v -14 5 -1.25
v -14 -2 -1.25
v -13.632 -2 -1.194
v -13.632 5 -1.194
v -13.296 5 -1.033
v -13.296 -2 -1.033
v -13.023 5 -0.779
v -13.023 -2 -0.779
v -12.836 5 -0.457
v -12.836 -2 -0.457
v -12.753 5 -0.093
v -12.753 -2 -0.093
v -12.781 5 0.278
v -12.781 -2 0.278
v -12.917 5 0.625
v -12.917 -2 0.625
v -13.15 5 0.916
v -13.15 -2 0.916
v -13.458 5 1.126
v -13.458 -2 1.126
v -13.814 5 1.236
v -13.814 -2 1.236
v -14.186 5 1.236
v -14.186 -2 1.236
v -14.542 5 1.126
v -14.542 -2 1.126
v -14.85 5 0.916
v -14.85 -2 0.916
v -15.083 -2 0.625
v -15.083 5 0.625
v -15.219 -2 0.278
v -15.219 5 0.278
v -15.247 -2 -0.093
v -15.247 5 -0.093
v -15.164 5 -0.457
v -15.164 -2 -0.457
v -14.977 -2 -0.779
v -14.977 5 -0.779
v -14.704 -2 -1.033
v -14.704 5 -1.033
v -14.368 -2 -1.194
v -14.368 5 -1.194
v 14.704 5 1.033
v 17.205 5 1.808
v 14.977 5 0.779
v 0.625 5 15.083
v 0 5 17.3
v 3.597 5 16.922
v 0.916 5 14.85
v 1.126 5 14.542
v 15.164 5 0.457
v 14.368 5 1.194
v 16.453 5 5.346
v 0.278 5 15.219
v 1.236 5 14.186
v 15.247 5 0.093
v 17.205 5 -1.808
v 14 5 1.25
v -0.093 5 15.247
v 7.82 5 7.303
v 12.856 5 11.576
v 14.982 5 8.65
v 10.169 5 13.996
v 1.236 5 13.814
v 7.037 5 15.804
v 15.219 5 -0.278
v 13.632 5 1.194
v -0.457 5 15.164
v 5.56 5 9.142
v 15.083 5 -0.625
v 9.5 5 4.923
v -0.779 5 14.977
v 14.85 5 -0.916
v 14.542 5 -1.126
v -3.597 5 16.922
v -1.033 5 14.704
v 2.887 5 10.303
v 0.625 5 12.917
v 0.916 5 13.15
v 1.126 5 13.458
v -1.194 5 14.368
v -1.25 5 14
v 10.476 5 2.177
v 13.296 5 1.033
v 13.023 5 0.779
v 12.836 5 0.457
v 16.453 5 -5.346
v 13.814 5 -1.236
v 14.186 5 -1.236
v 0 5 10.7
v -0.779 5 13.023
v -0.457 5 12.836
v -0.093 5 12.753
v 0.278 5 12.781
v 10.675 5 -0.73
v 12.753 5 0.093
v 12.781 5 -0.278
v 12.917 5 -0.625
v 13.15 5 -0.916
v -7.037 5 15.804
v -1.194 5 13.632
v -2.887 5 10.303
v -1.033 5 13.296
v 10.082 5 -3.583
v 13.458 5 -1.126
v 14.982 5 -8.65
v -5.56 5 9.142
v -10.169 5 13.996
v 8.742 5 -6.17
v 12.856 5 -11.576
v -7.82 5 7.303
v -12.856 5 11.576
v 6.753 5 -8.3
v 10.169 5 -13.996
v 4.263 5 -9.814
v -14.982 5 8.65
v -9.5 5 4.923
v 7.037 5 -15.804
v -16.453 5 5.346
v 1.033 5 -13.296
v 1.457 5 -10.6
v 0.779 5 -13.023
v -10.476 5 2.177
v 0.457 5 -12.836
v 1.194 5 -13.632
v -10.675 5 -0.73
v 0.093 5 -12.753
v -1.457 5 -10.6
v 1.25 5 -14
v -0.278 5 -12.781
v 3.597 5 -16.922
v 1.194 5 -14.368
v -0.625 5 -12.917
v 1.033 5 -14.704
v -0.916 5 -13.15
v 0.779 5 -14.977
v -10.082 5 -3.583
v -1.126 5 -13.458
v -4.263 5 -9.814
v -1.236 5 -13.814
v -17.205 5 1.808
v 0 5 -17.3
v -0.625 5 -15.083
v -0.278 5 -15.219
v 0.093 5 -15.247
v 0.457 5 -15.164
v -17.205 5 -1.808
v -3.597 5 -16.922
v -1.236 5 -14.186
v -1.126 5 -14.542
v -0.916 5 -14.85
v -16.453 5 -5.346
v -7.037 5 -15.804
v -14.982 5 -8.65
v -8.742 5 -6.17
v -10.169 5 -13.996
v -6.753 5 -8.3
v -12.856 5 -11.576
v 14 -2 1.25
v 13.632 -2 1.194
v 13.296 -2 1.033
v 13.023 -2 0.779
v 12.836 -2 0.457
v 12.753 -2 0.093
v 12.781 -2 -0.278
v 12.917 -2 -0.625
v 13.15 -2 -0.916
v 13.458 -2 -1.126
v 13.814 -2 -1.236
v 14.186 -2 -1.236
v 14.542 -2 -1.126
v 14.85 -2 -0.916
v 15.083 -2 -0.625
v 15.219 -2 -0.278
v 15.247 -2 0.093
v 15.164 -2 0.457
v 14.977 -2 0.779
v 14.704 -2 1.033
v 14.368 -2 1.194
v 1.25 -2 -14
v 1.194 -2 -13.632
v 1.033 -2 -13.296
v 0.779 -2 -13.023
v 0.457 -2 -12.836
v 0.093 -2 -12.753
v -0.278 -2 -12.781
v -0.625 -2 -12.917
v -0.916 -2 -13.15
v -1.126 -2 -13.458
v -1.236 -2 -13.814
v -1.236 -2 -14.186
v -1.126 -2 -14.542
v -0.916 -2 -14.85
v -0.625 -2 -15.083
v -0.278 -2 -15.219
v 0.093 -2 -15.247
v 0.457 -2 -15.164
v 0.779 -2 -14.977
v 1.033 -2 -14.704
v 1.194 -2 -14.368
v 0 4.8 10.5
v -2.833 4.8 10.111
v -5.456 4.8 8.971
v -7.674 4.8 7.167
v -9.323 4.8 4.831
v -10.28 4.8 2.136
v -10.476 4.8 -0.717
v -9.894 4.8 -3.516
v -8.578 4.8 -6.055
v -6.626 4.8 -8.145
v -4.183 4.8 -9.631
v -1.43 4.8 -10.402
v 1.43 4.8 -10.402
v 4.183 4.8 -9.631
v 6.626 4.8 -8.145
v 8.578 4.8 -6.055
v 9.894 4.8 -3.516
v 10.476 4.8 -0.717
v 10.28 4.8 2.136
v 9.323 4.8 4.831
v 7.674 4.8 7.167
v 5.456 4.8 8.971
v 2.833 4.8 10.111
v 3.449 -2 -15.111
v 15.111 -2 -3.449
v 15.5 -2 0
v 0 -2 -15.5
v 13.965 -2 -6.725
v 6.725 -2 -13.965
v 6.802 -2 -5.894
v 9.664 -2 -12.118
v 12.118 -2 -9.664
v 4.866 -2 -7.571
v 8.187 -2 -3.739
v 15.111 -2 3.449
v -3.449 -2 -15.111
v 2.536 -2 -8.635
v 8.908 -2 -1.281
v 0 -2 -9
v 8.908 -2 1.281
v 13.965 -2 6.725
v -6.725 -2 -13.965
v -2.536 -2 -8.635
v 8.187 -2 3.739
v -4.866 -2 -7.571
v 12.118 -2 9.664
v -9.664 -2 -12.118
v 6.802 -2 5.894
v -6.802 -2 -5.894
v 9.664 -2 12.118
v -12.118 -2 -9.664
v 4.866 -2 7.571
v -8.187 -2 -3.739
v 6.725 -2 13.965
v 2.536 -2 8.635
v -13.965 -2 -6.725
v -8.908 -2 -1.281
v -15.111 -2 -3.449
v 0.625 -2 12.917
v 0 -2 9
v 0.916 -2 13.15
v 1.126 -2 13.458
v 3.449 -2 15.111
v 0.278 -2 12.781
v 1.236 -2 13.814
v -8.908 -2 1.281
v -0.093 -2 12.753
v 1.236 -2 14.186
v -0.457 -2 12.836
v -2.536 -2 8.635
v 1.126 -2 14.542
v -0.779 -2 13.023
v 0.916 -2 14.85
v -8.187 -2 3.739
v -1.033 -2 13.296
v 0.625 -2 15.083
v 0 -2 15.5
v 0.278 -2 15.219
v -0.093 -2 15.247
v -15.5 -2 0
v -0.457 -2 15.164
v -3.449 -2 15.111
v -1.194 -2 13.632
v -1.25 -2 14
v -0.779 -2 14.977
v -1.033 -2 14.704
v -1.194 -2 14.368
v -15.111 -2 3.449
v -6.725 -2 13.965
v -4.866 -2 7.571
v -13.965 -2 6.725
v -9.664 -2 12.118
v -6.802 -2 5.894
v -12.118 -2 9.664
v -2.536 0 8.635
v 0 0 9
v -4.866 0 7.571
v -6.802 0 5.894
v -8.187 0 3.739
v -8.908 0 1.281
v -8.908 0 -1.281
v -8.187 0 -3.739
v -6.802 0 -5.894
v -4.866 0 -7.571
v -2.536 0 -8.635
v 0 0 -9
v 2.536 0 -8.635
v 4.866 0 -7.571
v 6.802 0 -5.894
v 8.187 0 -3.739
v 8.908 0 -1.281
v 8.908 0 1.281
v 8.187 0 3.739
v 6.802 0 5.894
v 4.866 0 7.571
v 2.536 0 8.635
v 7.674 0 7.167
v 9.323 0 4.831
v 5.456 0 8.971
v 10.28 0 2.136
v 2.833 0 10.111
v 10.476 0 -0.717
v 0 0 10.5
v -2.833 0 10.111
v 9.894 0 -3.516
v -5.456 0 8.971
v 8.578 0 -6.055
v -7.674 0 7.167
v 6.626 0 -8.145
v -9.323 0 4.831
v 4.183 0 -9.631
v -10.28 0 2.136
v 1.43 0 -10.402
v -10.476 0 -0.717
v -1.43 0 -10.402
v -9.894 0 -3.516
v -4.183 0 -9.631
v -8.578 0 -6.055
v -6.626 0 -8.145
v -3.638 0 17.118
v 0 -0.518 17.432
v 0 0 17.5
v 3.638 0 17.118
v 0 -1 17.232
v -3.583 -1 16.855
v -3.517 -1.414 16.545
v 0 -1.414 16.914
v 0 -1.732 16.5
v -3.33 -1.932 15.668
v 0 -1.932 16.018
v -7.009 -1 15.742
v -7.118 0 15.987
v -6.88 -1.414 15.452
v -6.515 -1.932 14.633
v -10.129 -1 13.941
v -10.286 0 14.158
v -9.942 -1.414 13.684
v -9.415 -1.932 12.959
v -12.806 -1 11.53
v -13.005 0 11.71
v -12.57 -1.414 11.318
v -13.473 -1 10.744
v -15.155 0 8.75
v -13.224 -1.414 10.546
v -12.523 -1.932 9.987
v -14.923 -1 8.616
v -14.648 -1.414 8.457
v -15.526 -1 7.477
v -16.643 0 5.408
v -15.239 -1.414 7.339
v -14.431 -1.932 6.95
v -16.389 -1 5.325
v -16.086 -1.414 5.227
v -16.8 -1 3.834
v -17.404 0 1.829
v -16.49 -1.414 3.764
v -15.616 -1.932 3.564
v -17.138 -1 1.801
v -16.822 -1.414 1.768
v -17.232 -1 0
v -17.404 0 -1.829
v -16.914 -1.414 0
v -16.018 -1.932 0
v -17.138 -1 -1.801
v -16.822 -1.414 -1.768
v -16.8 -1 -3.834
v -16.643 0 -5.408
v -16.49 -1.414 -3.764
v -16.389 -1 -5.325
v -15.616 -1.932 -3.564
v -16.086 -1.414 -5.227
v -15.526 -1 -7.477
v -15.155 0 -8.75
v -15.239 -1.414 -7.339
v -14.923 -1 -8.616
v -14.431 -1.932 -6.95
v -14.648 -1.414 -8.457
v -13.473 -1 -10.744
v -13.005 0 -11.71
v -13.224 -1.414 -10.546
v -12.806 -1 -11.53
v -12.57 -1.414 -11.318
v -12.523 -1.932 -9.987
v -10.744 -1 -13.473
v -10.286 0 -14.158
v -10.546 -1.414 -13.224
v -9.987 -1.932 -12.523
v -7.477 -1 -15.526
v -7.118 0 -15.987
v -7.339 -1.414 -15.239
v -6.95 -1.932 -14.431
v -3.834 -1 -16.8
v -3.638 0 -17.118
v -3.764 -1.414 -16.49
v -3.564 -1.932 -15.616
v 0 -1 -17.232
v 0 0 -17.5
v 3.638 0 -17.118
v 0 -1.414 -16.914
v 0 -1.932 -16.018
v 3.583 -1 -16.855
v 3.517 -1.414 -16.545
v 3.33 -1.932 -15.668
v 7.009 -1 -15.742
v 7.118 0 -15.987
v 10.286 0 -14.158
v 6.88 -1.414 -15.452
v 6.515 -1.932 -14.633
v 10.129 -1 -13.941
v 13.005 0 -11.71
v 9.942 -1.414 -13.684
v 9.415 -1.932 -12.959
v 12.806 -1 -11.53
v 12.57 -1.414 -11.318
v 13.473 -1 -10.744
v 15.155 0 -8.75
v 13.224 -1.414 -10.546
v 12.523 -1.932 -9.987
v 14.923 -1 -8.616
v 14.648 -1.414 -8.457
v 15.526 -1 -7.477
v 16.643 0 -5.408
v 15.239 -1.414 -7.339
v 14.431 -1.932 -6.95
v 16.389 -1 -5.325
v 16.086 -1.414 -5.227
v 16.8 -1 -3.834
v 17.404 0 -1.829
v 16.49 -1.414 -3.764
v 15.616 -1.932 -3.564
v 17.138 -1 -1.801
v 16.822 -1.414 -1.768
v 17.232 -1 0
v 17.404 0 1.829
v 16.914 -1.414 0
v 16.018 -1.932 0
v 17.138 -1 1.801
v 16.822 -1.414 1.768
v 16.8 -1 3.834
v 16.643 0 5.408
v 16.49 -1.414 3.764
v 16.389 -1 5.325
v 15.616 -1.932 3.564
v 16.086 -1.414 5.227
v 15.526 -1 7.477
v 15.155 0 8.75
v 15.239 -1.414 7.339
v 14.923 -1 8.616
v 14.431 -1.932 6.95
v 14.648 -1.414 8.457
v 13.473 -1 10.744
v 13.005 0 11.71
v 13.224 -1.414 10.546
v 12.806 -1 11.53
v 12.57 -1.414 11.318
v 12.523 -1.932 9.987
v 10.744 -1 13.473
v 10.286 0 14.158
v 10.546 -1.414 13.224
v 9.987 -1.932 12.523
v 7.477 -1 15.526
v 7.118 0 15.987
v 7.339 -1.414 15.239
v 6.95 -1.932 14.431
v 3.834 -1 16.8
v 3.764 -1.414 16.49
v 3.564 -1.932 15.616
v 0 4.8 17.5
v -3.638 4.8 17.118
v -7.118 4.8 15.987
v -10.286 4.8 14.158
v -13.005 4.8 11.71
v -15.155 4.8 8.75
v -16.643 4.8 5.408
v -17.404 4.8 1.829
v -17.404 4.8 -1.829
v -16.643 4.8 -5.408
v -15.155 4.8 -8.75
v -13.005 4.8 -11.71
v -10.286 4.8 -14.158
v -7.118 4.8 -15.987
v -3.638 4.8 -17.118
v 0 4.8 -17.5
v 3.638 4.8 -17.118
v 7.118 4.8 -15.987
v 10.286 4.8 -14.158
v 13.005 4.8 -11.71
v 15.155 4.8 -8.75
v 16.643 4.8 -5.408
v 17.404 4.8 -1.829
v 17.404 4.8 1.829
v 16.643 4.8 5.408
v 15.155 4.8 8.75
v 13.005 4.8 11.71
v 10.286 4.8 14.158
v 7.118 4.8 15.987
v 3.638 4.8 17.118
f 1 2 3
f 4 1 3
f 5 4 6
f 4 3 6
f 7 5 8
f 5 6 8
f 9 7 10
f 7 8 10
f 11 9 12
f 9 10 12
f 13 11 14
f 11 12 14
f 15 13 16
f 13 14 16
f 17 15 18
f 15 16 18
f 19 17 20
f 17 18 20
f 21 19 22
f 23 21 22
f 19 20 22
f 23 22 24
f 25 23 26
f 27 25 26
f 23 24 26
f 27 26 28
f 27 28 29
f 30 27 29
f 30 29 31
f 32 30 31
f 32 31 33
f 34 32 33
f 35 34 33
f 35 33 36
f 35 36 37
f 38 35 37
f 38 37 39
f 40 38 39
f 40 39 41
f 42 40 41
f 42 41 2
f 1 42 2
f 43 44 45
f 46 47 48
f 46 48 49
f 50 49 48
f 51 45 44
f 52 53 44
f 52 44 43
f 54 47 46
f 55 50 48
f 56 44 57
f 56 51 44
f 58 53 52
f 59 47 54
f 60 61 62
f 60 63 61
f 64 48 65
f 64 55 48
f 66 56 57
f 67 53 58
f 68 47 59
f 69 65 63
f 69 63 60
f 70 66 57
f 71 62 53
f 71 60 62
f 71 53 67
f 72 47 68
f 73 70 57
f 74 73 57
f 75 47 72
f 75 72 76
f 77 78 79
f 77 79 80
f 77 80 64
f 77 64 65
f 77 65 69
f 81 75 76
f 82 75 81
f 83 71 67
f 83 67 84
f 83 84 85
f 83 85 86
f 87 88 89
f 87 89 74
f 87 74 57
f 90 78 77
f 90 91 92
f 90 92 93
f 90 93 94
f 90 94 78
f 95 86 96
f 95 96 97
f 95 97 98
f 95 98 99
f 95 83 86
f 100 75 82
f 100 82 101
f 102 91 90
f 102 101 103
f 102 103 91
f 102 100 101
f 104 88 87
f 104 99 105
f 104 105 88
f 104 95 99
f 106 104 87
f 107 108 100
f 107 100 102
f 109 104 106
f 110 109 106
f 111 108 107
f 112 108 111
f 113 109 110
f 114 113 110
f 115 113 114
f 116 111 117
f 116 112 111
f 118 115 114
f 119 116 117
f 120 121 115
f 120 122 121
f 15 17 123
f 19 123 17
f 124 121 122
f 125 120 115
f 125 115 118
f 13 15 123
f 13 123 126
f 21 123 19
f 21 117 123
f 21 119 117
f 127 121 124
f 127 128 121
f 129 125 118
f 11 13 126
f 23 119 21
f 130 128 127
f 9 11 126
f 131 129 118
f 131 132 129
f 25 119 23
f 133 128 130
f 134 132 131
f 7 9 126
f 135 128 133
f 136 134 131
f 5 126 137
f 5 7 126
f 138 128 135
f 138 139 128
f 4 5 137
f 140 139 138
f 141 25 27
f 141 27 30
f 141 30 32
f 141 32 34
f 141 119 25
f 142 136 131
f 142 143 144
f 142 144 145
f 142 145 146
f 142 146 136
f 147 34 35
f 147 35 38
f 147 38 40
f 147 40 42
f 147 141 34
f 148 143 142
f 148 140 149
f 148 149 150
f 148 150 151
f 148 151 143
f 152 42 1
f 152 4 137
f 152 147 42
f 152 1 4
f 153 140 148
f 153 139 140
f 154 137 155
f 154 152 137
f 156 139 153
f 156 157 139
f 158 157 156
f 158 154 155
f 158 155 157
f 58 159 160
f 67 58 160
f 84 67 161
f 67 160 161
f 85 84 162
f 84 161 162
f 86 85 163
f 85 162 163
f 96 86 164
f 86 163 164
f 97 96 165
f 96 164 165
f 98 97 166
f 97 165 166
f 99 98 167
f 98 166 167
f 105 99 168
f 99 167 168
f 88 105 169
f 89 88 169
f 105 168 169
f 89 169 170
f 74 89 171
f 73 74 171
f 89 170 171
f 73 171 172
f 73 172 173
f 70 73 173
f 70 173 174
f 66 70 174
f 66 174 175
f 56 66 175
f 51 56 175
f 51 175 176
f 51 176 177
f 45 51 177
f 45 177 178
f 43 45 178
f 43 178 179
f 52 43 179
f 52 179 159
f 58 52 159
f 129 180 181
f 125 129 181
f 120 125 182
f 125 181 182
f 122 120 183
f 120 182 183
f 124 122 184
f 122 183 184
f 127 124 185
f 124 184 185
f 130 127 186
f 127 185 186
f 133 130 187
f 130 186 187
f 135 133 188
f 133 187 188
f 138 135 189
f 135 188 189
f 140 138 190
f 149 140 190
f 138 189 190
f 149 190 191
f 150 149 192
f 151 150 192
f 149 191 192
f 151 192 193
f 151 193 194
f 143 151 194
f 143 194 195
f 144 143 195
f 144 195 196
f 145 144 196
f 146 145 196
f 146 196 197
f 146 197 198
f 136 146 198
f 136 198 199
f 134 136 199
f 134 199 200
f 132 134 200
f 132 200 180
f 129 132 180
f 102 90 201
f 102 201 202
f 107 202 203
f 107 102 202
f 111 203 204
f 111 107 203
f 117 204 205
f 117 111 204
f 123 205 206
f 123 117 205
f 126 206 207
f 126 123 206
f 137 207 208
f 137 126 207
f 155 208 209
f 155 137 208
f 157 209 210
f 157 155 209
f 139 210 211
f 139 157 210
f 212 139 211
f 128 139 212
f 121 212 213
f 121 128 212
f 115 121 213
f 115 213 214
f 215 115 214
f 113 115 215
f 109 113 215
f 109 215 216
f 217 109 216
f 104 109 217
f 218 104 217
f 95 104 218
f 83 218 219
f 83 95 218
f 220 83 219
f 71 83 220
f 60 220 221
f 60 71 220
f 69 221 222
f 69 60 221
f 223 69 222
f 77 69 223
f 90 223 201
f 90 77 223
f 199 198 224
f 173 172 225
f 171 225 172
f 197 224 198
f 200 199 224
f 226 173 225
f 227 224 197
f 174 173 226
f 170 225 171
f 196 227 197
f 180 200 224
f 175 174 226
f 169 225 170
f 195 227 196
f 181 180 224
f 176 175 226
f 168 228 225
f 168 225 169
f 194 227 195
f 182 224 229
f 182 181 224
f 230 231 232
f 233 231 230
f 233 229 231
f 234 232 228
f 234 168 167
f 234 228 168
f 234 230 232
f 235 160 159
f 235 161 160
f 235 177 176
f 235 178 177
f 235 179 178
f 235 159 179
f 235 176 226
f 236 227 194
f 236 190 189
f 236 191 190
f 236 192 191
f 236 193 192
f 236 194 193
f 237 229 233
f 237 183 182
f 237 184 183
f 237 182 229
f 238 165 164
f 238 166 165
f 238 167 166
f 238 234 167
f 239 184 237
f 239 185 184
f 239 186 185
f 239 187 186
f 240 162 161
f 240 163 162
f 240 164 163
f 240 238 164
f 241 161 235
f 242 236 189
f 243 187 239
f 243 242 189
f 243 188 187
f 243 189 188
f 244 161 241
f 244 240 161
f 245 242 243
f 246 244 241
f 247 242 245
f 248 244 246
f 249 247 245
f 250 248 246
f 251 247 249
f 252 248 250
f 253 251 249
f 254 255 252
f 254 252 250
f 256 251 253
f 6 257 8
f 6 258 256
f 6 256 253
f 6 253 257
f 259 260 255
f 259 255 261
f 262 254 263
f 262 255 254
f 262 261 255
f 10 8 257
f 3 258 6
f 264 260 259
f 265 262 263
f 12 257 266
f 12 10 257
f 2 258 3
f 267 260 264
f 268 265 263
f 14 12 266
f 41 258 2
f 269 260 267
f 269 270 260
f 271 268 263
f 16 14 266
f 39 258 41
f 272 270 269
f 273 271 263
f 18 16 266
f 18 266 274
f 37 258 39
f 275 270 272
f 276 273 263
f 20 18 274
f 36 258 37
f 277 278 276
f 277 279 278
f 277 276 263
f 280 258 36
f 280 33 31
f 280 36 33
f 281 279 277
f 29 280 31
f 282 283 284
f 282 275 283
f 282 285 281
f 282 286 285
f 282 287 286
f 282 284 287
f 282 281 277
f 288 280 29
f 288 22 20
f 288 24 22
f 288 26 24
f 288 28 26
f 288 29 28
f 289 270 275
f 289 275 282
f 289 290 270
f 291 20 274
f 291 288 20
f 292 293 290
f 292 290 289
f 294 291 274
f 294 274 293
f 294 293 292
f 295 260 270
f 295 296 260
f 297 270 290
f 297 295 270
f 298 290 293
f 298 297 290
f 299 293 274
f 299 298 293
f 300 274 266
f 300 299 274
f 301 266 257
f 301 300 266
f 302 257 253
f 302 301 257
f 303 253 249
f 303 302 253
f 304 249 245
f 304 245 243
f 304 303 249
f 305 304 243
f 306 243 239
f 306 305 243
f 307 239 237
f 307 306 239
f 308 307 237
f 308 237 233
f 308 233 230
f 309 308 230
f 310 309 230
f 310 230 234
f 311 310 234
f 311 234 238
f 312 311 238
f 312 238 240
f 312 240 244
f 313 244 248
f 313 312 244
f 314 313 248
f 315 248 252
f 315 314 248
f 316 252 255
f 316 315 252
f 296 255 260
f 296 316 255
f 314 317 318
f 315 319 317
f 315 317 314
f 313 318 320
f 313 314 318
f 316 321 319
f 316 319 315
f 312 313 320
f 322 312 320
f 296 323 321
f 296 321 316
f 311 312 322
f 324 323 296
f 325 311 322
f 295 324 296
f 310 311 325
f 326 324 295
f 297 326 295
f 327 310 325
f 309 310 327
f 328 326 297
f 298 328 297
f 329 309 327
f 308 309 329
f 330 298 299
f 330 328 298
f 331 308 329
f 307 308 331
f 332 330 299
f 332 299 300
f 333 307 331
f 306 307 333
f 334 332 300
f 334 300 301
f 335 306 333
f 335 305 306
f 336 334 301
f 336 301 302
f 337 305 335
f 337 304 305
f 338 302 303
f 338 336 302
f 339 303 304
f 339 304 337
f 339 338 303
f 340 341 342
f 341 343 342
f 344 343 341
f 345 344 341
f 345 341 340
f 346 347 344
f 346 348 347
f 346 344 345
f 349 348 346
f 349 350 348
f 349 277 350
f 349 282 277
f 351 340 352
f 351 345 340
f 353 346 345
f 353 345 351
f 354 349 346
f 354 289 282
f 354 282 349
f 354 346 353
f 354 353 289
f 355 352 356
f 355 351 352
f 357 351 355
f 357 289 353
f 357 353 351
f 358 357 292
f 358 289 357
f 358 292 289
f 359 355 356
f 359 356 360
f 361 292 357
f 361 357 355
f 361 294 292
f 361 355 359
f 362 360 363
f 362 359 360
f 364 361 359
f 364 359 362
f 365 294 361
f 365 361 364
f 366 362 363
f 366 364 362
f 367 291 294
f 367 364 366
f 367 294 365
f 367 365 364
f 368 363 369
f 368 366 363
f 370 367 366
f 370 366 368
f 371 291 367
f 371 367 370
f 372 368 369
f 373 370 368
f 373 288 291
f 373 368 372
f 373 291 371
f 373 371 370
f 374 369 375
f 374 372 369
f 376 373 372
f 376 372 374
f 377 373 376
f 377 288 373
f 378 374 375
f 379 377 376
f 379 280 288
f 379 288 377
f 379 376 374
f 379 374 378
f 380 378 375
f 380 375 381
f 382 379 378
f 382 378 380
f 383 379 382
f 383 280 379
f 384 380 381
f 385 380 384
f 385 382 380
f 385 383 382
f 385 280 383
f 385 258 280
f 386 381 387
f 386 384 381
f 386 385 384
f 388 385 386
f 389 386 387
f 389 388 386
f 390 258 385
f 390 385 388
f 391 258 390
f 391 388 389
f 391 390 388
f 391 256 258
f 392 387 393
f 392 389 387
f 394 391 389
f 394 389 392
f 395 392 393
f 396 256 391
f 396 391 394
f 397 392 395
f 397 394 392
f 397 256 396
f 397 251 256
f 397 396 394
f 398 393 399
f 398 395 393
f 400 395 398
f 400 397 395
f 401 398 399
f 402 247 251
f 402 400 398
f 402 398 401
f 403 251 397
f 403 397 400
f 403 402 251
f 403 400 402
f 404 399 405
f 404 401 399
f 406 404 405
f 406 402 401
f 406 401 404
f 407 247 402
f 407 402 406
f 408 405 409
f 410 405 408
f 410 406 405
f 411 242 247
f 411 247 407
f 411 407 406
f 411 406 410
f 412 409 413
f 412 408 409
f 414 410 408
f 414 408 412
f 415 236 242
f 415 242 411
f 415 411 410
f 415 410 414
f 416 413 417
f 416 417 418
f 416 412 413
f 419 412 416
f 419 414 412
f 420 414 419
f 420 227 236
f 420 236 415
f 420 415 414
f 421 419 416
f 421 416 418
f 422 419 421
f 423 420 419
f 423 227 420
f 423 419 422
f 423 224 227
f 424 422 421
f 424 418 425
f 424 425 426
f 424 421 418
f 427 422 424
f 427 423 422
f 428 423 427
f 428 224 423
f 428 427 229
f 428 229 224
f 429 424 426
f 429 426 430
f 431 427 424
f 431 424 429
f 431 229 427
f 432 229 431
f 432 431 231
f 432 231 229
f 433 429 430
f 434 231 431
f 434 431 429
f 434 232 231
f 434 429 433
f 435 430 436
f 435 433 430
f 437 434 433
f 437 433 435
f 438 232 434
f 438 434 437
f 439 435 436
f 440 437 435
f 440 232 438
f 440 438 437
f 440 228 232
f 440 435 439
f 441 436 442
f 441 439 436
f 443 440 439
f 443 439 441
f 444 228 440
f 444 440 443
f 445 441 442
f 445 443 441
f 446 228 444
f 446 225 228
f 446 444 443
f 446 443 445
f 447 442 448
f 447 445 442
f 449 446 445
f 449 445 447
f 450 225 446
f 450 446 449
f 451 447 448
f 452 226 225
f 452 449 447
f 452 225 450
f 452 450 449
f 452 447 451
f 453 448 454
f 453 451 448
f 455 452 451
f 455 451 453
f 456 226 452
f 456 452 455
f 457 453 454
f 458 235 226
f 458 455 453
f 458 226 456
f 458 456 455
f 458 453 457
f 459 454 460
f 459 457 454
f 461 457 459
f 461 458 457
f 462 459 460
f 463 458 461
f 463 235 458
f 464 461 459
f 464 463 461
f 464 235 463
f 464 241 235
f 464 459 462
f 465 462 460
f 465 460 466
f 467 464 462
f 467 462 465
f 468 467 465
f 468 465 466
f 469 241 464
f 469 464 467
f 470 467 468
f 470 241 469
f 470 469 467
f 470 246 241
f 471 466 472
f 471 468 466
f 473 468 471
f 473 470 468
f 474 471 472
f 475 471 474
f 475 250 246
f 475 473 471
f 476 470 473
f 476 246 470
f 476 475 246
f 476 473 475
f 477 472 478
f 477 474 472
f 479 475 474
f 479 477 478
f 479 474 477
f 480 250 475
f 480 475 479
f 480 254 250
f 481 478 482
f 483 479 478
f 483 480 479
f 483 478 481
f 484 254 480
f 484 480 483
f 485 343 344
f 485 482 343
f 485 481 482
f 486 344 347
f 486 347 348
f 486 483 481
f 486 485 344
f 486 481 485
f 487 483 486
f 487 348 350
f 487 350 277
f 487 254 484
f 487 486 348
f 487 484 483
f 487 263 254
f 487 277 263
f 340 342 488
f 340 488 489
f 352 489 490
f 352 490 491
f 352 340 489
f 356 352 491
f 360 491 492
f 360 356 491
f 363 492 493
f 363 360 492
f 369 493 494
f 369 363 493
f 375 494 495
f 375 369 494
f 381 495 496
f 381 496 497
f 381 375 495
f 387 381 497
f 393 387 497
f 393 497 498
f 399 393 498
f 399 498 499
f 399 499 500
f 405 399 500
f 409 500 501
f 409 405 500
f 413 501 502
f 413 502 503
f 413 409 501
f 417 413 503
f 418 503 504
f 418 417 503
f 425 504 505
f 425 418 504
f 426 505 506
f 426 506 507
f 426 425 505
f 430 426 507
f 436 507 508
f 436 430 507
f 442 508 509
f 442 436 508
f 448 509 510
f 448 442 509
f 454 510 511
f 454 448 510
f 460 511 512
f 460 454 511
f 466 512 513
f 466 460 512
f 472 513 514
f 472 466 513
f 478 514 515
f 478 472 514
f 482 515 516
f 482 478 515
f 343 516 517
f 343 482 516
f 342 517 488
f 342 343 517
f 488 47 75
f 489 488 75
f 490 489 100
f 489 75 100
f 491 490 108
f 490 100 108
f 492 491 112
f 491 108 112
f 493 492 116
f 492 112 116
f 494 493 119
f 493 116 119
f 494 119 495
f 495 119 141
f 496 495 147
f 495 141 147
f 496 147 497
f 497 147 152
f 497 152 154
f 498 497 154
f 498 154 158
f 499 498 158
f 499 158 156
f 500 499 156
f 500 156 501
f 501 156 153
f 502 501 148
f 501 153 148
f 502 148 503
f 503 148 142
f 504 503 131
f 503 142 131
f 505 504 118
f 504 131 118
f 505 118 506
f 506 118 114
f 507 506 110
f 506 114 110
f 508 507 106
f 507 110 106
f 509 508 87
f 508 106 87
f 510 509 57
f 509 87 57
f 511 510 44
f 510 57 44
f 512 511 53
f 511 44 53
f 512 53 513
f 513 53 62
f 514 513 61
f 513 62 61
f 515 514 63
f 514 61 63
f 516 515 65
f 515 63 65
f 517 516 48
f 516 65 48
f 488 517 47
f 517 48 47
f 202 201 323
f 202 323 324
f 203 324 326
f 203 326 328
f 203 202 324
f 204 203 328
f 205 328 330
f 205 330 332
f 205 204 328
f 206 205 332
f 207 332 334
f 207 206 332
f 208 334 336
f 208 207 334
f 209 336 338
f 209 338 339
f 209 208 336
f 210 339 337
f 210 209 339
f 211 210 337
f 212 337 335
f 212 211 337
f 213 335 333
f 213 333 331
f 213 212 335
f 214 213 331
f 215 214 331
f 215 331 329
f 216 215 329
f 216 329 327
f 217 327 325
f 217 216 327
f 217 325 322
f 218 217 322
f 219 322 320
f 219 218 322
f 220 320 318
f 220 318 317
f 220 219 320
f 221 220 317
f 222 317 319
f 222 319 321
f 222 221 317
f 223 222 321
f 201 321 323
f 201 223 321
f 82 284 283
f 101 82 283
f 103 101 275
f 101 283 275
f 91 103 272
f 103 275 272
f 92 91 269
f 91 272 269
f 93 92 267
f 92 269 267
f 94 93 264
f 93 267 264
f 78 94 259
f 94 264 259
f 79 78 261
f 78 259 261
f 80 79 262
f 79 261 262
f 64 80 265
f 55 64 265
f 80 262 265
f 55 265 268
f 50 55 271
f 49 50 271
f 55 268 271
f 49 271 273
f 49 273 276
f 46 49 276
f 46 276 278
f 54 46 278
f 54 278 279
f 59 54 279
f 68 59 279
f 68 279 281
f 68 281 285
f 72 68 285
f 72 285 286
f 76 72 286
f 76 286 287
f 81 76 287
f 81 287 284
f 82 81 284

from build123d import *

# Parameters (mm, degrees)
TROU_TARAUD_M31_D            = 2.5
R_P_TITION_CIRCULAIRE1_COUNT = 4
CHANFREIN1_SIZE              = 0.2
CONG_1_R                     = 2


with BuildPart() as part:
    # Esquisse1 → Révolution1 (revolve)
    with BuildSketch(Plane(origin=(0, 0, 0), x_dir=(0, 0, -1), z_dir=(1, 0, 0))):
        Polygon((-9, -2), (-9, 0), (-10.5, 0), (-10.5, 5), (-17.5, 5), (-17.5, -2), align=None)
    revolve(axis=Axis((0, 0, 0), (0, -1, 0)))

    # Trou taraudé M31 (through all)
    with Locations(Plane(origin=(0, 5, 0), x_dir=(-1, 0, 0), z_dir=(0, 1, 0))):
        with Locations((0, -14)):
            trou_taraud_m31 = Hole(TROU_TARAUD_M31_D / 2)

    # Répétition circulaire1: Trou taraudé M31 ×4 about axis
    r_p_tition_circulaire1_axis = Axis((0, 0, 0), (0, 1, 0))
    for i in range(1, R_P_TITION_CIRCULAIRE1_COUNT):
        add(trou_taraud_m31.rotate(r_p_tition_circulaire1_axis, i * 360 / R_P_TITION_CIRCULAIRE1_COUNT), mode=Mode.SUBTRACT)

    # Chanfrein1
    chanfrein1_edges = [part.edges().sort_by_distance(p)[0] for p in [
        (0, 5, -17.5),
        (0, 5, -10.5),
    ]]
    chamfer(chanfrein1_edges, length=CHANFREIN1_SIZE)

    # Congé1
    cong_1_edges = [part.edges().sort_by_distance(p)[0] for p in [
        (0, -2, -17.5),
    ]]
    fillet(cong_1_edges, radius=CONG_1_R)


solid = part.part
